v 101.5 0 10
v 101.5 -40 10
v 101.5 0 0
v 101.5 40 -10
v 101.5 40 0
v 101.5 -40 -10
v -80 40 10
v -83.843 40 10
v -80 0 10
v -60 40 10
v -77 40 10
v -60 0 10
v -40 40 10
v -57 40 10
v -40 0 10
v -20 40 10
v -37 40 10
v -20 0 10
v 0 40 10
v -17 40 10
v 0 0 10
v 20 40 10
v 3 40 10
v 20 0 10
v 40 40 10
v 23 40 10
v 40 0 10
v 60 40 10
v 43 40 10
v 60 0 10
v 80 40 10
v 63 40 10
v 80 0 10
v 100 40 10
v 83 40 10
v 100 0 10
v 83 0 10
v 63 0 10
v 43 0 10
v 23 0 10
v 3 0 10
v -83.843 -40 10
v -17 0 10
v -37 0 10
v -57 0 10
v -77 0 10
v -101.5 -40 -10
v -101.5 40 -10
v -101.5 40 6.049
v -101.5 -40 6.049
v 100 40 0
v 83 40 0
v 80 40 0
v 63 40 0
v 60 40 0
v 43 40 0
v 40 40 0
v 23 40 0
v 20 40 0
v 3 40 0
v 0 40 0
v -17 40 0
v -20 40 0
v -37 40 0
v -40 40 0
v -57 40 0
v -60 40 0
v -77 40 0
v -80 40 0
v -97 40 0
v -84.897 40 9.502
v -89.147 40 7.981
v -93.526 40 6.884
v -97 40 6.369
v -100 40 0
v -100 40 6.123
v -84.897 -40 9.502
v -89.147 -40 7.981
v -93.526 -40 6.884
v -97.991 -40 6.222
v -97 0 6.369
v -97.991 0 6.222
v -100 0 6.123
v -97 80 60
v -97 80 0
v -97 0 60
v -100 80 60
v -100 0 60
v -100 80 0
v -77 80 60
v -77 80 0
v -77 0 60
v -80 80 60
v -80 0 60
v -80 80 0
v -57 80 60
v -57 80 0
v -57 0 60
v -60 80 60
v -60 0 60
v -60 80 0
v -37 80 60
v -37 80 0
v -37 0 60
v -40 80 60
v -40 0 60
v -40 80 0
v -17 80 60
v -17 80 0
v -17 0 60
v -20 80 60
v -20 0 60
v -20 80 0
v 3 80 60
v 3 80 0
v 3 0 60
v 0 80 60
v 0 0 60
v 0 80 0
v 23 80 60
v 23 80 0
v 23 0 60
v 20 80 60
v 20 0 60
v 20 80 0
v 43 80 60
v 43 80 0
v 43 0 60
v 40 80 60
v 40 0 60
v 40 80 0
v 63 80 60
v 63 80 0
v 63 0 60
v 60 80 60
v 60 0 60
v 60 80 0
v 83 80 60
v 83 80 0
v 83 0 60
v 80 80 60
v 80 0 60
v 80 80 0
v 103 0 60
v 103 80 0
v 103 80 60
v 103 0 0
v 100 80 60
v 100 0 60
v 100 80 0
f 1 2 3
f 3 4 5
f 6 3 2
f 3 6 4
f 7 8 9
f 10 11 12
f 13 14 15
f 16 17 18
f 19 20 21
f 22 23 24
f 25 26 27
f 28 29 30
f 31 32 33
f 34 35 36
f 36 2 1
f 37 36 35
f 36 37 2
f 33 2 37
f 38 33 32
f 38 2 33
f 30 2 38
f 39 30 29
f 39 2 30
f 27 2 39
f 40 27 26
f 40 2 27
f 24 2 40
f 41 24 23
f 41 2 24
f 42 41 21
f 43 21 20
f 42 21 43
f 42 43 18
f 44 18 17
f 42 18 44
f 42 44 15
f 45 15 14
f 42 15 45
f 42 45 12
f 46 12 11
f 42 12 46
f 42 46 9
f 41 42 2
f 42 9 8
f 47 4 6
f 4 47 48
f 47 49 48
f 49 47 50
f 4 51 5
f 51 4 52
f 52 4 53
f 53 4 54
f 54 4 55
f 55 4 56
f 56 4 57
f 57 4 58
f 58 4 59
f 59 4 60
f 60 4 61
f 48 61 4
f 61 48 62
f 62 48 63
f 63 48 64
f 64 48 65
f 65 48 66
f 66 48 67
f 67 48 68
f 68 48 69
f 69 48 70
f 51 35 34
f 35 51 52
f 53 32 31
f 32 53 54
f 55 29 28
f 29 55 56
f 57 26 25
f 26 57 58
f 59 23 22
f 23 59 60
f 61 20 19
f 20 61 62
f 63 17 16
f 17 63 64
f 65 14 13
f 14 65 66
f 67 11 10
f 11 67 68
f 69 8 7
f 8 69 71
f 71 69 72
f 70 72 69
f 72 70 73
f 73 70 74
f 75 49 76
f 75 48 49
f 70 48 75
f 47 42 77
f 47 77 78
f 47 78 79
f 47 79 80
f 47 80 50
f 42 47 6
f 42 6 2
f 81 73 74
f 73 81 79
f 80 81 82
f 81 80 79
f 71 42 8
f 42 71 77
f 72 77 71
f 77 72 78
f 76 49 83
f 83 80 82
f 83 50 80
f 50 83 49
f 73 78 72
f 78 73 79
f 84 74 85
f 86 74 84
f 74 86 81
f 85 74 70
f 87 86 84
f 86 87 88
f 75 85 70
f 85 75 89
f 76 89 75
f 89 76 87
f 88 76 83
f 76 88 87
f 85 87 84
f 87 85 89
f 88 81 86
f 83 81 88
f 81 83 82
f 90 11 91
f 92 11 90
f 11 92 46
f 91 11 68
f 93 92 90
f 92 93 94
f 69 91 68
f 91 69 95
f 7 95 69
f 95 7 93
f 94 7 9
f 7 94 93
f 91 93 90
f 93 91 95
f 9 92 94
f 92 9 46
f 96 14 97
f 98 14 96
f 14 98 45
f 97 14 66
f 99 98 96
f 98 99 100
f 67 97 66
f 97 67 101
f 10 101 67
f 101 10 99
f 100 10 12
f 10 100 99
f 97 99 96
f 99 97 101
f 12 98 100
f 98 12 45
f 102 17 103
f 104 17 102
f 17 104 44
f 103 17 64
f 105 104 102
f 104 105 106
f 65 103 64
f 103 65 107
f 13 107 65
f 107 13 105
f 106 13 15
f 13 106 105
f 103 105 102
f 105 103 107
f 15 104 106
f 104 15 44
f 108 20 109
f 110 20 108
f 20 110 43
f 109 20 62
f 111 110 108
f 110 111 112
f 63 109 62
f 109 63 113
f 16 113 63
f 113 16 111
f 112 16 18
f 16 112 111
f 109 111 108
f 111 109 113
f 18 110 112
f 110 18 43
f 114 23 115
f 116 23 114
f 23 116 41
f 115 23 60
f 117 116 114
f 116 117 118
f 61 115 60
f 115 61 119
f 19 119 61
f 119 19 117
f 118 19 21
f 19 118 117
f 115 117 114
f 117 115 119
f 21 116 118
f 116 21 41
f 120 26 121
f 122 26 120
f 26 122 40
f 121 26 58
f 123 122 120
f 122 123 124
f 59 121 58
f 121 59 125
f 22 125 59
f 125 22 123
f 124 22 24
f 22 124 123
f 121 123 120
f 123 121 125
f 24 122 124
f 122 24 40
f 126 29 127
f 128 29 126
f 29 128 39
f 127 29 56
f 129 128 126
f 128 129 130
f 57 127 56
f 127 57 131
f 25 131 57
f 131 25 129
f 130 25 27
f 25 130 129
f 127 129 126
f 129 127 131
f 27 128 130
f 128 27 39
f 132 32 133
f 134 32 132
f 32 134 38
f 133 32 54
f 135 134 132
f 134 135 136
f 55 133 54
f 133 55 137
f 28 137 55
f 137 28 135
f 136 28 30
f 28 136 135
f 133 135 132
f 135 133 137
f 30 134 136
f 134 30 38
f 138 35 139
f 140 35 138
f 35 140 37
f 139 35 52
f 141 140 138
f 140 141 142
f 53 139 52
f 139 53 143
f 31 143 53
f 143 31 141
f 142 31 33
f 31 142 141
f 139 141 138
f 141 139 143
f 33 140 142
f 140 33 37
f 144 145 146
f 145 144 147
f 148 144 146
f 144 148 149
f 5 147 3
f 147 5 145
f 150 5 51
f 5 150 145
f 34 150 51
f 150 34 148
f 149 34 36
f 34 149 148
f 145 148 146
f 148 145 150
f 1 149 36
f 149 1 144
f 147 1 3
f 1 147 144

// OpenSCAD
// 10-dish Petri rack, printed as used (base flat on XY, z=0)

// ---- Base block ----
base_L = 203;   // length along X
base_W = 80;    // width along Y
base_H = 20;    // height of base block

// ---- Curved cradle (cut from base only) ----
cradle_R = 46;  // radius of cradle cylinder
cradle_cy = 0;  // Y of cradle axis
cradle_cz = 52; // Z of cradle axis  -> cradle bottoms at 52-46 = 6

// ---- Divider plates (solid, cradle does NOT cut them) ----
div_T  = 3;     // plate thickness (X)
div_H  = 60;    // plate height (z=0..60)
div_W  = 80;    // plate width (Y, same as base)
div_xs = [-100, -80, -60, -40, -20, 0, 20, 40, 60, 80, 100]; // 11 plates, 20 mm apart

$fn = 64;

// Base block with the cradle pocket cut along its full length
module base() {
    difference() {
        cube([base_L, base_W, base_H], center = true);
        // cradle cutter: cylinder axis along X, extended 1 mm past each end
        translate([-base_L/2 - 1, cradle_cy, cradle_cz])
            rotate([90, 0, 0])
                cylinder(h = base_L + 2, r = cradle_R, center = true);
    }
}

// Eleven solid divider plates (cradle is not cut through them)
module dividers() {
    union() {
        for (x = div_xs) {
            translate([x, 0, 0])
                cube([div_T, div_W, div_H], center = [true, true, false]);
        }
    }
}

// Final part: base + dividers
union() {
    base();
    dividers();
}
